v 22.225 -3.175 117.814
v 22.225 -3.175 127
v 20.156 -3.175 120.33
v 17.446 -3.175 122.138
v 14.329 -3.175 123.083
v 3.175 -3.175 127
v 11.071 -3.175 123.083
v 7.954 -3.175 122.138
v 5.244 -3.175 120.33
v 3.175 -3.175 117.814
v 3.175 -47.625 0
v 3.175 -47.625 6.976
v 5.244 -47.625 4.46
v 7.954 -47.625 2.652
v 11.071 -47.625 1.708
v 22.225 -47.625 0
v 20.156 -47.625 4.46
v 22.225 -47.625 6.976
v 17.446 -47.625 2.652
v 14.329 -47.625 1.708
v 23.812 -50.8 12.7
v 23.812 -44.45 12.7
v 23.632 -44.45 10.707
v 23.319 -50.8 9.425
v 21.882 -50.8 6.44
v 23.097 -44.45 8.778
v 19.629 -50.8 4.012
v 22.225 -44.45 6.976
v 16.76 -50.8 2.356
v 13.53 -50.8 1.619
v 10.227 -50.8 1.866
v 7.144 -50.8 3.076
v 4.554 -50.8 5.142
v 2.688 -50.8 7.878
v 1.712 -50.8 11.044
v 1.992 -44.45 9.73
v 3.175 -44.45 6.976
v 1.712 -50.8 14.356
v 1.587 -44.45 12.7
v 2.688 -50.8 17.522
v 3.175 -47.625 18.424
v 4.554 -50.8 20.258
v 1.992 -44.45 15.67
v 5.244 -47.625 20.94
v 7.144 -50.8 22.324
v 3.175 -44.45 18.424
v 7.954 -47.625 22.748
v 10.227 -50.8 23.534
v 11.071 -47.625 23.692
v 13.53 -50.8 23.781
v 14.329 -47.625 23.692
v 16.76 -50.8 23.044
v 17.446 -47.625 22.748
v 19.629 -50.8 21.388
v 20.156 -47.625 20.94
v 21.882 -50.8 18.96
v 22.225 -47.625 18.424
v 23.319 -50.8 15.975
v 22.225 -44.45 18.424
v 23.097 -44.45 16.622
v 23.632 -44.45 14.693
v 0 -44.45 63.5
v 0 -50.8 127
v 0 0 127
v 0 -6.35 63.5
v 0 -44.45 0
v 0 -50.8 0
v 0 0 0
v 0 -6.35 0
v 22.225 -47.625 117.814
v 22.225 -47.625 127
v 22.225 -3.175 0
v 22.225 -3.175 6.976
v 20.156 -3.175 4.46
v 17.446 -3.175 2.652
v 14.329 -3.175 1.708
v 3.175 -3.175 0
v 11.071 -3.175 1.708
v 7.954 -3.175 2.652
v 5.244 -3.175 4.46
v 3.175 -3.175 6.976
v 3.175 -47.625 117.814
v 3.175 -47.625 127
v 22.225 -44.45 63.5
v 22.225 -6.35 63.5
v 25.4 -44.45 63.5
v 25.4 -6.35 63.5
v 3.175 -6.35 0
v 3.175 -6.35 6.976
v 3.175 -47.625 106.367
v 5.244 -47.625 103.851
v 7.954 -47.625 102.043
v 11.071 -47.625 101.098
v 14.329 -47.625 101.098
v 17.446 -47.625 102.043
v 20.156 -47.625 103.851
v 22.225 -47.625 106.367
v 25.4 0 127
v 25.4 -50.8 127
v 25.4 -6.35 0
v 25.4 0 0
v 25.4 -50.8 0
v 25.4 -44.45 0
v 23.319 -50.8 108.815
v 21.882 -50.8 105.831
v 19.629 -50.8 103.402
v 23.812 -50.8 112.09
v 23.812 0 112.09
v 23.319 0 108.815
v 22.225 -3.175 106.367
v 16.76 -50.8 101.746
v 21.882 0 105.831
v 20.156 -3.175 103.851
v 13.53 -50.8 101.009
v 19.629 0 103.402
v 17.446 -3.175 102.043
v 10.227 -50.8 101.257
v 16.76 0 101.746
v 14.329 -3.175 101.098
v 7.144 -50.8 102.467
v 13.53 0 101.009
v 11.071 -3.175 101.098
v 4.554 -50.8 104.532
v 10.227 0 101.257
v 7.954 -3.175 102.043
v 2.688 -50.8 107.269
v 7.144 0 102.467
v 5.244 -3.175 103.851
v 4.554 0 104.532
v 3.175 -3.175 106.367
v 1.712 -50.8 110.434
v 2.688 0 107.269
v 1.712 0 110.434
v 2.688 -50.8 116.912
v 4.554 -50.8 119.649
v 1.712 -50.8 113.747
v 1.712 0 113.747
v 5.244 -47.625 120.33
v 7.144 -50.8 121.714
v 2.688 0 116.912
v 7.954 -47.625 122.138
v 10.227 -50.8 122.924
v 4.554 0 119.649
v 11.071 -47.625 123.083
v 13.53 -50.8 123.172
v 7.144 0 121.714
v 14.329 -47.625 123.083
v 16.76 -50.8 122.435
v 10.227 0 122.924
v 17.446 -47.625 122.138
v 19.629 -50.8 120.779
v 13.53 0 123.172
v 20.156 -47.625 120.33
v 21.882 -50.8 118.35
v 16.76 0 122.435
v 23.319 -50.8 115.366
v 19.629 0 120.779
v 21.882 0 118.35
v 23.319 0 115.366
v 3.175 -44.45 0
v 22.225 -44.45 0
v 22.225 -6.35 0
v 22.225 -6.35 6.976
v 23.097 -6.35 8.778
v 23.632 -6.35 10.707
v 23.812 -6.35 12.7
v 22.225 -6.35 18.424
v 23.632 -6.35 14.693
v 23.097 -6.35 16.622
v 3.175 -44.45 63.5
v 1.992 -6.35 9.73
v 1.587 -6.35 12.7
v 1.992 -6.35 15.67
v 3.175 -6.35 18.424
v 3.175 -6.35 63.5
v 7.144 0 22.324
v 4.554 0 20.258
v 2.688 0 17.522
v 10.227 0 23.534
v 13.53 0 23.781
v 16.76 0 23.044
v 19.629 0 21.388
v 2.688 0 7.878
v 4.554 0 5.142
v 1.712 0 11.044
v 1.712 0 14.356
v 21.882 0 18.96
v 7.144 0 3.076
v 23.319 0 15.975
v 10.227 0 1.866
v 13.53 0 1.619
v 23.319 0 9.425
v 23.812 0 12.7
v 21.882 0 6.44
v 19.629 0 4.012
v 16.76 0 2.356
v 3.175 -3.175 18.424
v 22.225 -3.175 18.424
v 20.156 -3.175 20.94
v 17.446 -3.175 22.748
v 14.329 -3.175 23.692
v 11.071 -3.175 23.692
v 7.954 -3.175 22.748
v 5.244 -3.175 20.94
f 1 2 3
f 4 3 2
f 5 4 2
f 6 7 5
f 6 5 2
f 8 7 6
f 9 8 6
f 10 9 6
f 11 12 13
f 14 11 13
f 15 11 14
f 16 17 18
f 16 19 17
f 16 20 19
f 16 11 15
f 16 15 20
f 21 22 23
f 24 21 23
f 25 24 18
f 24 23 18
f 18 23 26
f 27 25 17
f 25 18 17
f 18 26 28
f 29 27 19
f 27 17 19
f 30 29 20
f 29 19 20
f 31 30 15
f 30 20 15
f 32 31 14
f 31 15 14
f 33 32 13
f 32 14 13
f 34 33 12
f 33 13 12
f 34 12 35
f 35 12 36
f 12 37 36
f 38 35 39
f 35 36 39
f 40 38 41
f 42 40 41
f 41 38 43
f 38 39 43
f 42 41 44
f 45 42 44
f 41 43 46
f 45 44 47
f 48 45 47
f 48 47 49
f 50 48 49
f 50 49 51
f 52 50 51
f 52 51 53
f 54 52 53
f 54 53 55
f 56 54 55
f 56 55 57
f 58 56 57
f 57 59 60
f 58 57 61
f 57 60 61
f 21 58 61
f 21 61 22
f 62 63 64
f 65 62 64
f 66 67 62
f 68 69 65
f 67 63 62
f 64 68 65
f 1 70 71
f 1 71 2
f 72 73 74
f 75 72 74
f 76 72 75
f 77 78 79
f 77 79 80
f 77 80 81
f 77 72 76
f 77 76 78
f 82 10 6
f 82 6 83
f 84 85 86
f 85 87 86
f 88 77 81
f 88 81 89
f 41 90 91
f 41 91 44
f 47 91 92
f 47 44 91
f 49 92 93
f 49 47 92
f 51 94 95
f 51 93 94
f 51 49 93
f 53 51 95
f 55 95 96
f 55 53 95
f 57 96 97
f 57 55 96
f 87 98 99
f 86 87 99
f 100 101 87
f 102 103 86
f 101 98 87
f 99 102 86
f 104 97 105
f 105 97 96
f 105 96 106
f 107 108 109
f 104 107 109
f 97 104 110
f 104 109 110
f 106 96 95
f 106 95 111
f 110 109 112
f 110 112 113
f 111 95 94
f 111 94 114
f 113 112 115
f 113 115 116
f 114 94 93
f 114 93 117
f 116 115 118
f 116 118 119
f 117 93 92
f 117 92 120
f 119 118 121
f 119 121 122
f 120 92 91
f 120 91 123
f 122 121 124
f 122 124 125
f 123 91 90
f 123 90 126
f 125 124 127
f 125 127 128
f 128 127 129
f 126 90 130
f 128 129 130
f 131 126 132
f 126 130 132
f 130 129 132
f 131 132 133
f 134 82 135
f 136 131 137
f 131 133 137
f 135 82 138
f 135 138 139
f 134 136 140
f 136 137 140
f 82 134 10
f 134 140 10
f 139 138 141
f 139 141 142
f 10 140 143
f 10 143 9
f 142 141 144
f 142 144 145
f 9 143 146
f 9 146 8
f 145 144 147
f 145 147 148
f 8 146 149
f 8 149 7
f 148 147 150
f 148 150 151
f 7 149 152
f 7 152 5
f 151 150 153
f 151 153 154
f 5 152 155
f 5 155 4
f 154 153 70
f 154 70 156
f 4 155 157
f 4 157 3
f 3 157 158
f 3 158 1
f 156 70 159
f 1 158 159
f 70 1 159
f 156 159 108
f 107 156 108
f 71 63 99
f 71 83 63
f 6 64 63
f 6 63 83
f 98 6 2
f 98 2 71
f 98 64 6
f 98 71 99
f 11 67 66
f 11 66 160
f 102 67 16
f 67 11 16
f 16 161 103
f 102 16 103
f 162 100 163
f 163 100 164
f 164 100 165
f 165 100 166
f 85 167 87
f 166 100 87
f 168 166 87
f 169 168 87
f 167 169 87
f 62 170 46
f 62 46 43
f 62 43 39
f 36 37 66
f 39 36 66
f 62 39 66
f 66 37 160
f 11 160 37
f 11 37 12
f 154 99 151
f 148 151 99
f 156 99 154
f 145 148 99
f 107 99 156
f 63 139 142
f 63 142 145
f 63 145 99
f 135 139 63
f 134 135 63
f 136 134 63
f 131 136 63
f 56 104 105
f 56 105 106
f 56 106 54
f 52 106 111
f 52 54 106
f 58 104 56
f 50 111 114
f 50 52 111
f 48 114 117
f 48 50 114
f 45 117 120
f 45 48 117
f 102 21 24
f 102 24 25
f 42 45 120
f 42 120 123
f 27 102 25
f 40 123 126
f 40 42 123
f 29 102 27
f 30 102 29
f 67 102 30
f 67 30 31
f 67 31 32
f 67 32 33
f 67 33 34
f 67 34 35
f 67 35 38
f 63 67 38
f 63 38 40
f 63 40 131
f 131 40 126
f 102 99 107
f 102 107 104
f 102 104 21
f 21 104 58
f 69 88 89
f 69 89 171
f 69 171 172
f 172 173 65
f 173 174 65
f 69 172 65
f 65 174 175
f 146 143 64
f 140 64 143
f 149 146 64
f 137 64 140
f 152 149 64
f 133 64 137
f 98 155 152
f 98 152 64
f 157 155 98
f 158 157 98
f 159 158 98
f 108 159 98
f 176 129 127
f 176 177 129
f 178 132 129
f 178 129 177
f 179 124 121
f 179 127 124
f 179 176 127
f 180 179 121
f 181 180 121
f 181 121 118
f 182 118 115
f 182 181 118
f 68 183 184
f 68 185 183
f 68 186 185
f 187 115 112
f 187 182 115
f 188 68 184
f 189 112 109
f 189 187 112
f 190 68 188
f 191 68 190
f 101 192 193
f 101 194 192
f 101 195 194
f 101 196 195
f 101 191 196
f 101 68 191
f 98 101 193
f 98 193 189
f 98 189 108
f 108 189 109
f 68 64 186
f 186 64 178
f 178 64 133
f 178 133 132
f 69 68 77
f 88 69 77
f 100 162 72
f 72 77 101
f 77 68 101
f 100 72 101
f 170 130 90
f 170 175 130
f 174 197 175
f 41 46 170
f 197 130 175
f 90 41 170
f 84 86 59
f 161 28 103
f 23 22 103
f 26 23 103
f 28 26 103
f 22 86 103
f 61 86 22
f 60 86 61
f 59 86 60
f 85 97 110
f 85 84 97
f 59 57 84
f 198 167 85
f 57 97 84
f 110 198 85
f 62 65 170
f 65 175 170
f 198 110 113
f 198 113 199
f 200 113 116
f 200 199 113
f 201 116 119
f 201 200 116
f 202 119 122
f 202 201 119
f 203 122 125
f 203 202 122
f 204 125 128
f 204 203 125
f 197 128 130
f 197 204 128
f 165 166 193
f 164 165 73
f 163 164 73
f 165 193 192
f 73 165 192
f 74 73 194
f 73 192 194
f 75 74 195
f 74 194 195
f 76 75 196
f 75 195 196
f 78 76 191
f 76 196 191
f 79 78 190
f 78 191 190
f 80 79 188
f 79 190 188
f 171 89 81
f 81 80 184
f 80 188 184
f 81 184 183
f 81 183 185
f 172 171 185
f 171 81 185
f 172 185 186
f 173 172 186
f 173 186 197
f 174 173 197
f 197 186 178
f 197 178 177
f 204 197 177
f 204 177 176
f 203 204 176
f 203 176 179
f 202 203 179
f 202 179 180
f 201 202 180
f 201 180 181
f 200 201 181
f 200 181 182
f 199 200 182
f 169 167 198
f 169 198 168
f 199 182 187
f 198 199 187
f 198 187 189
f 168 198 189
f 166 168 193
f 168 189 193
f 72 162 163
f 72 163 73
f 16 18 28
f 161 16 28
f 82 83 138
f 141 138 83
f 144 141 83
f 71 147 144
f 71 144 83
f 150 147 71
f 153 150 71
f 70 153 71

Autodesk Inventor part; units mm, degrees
ref_plane "YZ Plane" through (0, 0, 0) normal (1, 0, 0) x (0, 1, 0)
ref_plane "XZ Plane" through (0, 0, 0) normal (0, 1, 0) x (-1, 0, 0)
ref_plane "XY Plane" through (0, 0, 0) normal (0, 0, 1) x (1, 0, 0)
sketch "Sketch1" plane through (0, 0, 0) normal (0, 0, 1) x (1, 0, 0)
  line L0 (0, 0) -> (25.4, 0)
  line L1 (25.4, 0) -> (25.4, -50.8)
  line L2 (25.4, -50.8) -> (0, -50.8)
  line L3 (0, -50.8) -> (0, 0)
  line L4 (22.225, -3.175) -> (3.175, -3.175)
  line L5 (3.175, -3.175) -> (3.175, -47.625)
  line L6 (3.175, -47.625) -> (22.225, -47.625)
  line L7 (22.225, -47.625) -> (22.225, -3.175)
  dimension "d0" = 25.4
  dimension "d1" = 50.8
  dimension "d2" = 3.175
extrude "Extrusion1" add sketch "Sketch1" along normal blind 127
sketch "Sketch2" plane through (0, 0, 0) normal (0, 1, 0) x (1, 0, 0)
  circle A0 centre (12.7, -12.7) radius 11.1125
  line L0 (0, 0) -> (0, -127) projected
  line L1 (0, 0) -> (25.4, 0) projected
  circle A1 centre (12.7, -112.0904) radius 11.1125
  circle A2 centre (12.7, -211.4809) radius 11.1125
  dimension "d5" = 12.7
  dimension "d6" = 12.7
  dimension "d7" = 22.225
  dimension "d8" = 99.3904
  dimension "d9" = 99.3904
  dimension "d10" = 12.7
  dimension "d11" = 22.225
  dimension "d12" = 12.7
  dimension "d13" = 22.225
extrude "Extrusion2" cut sketch "Sketch2" against normal blind 127
sketch "Sketch3" plane through (25.4, -50.8, 0) normal (1, 0, 0) x (0, 0, -1)
  line L0 (0, 44.45) -> (-63.5, 44.45)
  line L1 (-63.5, 44.45) -> (-63.5, 6.35)
  line L2 (-63.5, 6.35) -> (0, 6.35)
  line L3 (0, 6.35) -> (0, 44.45)
  line L4 (0, 50.8) -> (-127, 50.8) projected
  line L5 (0, 0) -> (-127, 0) projected
  line L6 (0, 50.8) -> (0, 0) projected
  dimension "d19" = 6.35
  dimension "d20" = 6.35
  dimension "d21" = 38.1
  dimension "d22" = 63.5
  dimension "d23" = 0
extrude "Extrusion3" cut sketch "Sketch3" against normal blind 127
properties part number "C Arm"
